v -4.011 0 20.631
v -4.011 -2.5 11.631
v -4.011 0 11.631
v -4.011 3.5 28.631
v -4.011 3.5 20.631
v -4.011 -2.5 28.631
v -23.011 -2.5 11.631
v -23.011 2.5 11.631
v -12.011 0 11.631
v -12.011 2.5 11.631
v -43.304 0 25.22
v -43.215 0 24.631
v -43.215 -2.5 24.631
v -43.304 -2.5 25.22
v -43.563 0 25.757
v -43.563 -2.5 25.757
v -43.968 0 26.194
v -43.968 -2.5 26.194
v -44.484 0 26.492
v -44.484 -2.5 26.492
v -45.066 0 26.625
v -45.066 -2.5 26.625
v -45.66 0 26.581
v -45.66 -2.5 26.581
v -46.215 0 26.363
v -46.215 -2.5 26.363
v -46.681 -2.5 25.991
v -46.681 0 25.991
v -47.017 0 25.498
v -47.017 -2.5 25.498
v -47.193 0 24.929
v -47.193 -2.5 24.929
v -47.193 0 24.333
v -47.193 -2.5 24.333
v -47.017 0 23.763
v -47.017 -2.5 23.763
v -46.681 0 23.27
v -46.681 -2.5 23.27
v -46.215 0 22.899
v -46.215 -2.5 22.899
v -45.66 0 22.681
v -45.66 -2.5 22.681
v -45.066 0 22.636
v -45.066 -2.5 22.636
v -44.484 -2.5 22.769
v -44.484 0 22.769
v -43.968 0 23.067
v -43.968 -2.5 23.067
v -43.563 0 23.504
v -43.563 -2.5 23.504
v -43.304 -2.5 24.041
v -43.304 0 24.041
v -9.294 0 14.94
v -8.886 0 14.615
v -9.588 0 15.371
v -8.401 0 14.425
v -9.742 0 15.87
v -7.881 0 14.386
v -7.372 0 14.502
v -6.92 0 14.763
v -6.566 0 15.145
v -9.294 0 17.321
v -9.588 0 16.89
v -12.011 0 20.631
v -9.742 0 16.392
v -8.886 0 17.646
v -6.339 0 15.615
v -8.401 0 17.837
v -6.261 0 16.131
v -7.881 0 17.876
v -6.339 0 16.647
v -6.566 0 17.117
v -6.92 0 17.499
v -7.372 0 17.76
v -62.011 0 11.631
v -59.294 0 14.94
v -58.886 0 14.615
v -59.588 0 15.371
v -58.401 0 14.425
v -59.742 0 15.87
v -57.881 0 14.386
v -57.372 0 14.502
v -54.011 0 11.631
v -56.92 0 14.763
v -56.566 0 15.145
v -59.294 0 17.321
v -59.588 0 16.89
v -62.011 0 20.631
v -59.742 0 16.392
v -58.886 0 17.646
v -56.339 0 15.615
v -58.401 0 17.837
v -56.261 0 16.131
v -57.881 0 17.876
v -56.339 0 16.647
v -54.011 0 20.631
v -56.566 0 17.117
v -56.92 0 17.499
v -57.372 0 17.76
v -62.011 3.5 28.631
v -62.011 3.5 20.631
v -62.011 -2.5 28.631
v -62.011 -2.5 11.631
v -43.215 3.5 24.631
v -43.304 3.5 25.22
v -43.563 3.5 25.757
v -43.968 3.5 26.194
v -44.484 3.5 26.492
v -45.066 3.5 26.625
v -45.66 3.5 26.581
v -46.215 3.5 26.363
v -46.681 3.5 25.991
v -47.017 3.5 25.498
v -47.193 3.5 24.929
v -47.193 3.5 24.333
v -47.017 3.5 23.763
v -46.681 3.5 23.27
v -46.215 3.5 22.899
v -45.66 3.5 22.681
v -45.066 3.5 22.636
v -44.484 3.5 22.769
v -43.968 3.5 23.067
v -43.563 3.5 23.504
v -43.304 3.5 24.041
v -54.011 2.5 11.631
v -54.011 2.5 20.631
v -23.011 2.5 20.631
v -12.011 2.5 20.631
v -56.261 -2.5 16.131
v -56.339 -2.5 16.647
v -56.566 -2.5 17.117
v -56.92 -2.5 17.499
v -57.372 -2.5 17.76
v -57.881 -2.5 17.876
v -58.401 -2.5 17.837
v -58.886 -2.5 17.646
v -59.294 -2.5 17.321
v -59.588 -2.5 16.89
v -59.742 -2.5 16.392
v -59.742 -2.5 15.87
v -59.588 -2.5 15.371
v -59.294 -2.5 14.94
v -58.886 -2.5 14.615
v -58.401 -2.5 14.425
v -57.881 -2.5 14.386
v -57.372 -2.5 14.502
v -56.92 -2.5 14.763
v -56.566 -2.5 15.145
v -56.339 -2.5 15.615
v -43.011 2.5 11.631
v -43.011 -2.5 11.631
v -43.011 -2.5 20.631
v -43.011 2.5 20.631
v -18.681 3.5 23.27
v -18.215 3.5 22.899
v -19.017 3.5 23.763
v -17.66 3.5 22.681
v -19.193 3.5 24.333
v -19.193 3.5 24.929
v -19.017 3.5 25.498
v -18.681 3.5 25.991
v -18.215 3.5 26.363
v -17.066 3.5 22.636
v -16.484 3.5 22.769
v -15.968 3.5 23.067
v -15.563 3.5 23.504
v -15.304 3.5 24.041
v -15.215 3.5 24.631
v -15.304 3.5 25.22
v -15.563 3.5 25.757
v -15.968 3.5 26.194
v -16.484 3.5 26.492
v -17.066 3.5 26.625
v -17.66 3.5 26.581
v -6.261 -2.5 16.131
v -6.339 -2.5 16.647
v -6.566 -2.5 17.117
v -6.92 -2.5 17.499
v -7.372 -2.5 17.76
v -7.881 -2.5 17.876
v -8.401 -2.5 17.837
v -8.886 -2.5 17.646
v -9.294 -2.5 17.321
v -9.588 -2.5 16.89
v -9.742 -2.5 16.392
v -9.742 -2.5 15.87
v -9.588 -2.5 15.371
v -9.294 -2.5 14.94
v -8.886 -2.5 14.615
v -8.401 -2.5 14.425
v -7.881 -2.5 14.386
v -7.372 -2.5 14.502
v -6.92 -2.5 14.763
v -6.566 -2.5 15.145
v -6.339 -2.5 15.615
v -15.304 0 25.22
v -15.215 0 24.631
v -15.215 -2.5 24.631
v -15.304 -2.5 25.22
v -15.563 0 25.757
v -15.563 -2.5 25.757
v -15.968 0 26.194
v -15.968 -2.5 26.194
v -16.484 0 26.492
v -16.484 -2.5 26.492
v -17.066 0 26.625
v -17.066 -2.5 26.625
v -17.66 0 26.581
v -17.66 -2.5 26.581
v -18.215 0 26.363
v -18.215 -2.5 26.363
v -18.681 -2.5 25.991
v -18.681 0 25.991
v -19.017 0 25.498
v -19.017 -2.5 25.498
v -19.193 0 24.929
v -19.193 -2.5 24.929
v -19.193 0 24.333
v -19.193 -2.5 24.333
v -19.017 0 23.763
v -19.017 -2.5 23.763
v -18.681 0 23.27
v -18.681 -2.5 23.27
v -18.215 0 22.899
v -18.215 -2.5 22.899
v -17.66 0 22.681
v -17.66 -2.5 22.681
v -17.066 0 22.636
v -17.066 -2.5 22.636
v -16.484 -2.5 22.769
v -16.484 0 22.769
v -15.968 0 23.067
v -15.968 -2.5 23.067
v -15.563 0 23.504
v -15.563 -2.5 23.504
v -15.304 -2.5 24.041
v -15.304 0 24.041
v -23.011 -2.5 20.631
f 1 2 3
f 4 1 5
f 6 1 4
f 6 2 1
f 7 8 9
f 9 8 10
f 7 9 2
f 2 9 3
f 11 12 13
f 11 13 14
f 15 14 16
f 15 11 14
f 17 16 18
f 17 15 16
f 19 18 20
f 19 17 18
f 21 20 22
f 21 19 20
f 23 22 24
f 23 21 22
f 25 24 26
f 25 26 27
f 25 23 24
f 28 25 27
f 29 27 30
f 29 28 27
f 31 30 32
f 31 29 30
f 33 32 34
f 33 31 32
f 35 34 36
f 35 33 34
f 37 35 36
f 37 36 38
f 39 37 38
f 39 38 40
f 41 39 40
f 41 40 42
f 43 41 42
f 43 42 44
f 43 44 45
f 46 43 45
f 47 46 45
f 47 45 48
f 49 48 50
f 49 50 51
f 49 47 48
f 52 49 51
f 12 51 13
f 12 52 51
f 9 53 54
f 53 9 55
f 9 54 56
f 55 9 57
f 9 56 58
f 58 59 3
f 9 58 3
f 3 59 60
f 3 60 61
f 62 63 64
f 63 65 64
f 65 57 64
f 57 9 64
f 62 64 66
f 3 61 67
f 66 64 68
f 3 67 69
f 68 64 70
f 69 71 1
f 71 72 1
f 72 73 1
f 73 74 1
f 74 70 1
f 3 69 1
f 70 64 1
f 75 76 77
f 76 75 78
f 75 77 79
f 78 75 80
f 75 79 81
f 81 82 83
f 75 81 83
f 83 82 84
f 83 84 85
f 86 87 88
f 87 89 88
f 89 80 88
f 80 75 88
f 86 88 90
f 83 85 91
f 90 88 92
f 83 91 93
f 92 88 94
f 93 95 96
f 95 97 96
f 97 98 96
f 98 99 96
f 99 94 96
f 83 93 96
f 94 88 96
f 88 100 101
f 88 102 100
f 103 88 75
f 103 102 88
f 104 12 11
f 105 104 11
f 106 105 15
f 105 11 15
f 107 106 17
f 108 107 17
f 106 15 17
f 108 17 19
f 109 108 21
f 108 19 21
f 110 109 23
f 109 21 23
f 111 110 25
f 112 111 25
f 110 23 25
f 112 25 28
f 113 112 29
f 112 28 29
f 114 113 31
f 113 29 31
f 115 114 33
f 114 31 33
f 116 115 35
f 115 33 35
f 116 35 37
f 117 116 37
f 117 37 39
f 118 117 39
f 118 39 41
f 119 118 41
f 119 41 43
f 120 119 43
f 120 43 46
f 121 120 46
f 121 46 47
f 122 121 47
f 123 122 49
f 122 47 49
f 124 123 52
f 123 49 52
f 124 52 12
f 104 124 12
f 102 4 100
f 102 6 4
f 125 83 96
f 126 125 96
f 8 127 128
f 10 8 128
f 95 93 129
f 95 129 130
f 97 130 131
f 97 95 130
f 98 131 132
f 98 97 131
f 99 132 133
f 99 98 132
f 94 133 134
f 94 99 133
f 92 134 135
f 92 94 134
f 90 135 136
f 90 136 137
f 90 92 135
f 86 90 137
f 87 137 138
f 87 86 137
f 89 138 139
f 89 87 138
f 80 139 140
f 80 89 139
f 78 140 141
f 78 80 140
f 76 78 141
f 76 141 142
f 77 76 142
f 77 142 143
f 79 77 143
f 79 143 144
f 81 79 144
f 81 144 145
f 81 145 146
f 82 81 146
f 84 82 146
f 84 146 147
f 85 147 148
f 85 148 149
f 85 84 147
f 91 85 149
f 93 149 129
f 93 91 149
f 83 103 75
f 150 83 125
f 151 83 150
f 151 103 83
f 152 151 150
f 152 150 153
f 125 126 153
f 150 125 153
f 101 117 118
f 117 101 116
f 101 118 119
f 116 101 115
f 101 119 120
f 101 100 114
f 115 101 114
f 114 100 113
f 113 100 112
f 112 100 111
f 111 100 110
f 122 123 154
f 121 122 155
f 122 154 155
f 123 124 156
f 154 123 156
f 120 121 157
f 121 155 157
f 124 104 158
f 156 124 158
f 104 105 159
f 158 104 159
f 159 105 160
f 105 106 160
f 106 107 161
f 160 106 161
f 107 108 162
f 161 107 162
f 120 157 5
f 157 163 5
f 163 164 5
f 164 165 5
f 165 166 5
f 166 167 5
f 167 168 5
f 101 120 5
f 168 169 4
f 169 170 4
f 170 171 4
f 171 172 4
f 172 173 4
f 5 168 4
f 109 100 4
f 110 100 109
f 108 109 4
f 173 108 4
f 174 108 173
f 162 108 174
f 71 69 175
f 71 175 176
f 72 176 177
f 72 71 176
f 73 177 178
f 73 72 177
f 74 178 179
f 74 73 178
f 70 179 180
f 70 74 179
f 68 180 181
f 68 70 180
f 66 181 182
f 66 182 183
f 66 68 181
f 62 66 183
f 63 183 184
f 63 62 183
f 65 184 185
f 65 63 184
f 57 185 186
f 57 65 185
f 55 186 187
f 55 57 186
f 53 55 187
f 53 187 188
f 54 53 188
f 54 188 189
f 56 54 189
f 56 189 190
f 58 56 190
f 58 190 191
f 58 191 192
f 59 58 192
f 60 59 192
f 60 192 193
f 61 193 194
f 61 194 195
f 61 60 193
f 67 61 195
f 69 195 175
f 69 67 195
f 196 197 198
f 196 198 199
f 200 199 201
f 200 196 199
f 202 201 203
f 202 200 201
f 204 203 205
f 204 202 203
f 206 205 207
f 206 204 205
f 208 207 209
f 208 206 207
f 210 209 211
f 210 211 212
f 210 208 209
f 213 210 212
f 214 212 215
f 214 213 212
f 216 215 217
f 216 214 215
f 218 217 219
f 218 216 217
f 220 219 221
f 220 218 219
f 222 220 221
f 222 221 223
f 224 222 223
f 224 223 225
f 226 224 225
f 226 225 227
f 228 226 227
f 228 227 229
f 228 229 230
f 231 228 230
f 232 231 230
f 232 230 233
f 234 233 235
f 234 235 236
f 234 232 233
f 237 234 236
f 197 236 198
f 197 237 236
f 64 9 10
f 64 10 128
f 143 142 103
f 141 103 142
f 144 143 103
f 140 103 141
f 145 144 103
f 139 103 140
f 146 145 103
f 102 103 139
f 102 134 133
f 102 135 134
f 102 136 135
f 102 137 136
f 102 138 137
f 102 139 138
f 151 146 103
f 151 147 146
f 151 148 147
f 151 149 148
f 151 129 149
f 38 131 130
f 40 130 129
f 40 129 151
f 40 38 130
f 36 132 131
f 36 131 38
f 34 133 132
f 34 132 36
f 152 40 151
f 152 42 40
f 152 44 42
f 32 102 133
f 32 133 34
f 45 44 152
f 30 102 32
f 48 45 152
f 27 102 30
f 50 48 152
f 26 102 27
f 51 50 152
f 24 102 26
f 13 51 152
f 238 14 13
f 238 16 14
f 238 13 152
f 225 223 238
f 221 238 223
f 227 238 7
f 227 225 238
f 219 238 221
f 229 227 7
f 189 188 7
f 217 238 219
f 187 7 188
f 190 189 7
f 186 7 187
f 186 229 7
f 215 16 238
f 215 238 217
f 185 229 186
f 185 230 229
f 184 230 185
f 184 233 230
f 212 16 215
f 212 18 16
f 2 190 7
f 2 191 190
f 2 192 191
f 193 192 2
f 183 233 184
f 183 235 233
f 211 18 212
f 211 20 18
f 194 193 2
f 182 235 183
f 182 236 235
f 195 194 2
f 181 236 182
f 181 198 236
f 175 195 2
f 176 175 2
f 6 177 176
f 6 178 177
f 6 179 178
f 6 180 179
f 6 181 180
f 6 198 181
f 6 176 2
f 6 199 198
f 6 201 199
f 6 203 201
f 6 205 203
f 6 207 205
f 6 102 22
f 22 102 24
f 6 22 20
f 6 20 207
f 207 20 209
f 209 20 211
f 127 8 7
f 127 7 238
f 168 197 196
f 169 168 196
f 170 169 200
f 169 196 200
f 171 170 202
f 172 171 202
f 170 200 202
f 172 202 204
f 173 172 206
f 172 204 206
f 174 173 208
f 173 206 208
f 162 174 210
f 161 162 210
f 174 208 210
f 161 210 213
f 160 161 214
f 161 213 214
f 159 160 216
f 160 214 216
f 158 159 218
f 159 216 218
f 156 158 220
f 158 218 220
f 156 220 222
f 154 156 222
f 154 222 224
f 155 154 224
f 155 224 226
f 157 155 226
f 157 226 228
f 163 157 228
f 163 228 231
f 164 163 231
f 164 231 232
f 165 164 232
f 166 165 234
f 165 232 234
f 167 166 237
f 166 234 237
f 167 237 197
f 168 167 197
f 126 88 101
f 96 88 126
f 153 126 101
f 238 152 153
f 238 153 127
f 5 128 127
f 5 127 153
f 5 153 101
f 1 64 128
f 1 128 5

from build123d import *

# Parameters (mm, degrees)
F0_R     = 2
F0_W     = 8
F0_H     = 9
F0_R_2   = 1.75
F0_W_2   = 11
F1_DEPTH = 2.5
F2_DEPTH = 2.5
F3_DEPTH = 3.5


with BuildPart() as f1:
    # F0 (on Front) → F1 (new body)
    with BuildSketch(Plane.XZ):
        Polygon((-62.011425, 28.630727), (-62.011425, 20.630727), (-54.011425, 20.630727), (-43.011425, 20.630727), (-23.011425, 20.630727), (-12.011425, 20.630727), (-4.011425, 20.630727), (-4.011425, 28.630727), align=None)
        with Locations((-45.215137, 24.630727)):
            Circle(F0_R, mode=Mode.SUBTRACT)
        with Locations((-17.215137, 24.630727)):
            Circle(F0_R, mode=Mode.SUBTRACT)
        with Locations((-58.011425, 16.130727)):
            Rectangle(F0_W, F0_H)
        with Locations((-58.011425, 16.130727)):
            Circle(F0_R_2, mode=Mode.SUBTRACT)
        with Locations((-48.511425, 16.130727)):
            Rectangle(F0_W_2, F0_H)
        with Locations((-17.511425, 16.130727)):
            Rectangle(F0_W_2, F0_H)
        with Locations((-8.011425, 16.130727)):
            Rectangle(F0_W, F0_H)
        with Locations((-8.011425, 16.130727)):
            Circle(F0_R_2, mode=Mode.SUBTRACT)
    extrude(amount=F1_DEPTH)

    # F0 (on Front) → F2 (join)
    with BuildSketch(Plane.XZ):
        with Locations((-48.511425, 16.130727)):
            Rectangle(F0_W_2, F0_H)
        with Locations((-17.511425, 16.130727)):
            Rectangle(F0_W_2, F0_H)
    extrude(amount=-F2_DEPTH)

    # F0 (on Front) → F3 (join)
    with BuildSketch(Plane.XZ):
        Polygon((-62.011425, 28.630727), (-62.011425, 20.630727), (-54.011425, 20.630727), (-43.011425, 20.630727), (-23.011425, 20.630727), (-12.011425, 20.630727), (-4.011425, 20.630727), (-4.011425, 28.630727), align=None)
        with Locations((-45.215137, 24.630727)):
            Circle(F0_R, mode=Mode.SUBTRACT)
        with Locations((-17.215137, 24.630727)):
            Circle(F0_R, mode=Mode.SUBTRACT)
    extrude(amount=-F3_DEPTH)


solid = f1.part
